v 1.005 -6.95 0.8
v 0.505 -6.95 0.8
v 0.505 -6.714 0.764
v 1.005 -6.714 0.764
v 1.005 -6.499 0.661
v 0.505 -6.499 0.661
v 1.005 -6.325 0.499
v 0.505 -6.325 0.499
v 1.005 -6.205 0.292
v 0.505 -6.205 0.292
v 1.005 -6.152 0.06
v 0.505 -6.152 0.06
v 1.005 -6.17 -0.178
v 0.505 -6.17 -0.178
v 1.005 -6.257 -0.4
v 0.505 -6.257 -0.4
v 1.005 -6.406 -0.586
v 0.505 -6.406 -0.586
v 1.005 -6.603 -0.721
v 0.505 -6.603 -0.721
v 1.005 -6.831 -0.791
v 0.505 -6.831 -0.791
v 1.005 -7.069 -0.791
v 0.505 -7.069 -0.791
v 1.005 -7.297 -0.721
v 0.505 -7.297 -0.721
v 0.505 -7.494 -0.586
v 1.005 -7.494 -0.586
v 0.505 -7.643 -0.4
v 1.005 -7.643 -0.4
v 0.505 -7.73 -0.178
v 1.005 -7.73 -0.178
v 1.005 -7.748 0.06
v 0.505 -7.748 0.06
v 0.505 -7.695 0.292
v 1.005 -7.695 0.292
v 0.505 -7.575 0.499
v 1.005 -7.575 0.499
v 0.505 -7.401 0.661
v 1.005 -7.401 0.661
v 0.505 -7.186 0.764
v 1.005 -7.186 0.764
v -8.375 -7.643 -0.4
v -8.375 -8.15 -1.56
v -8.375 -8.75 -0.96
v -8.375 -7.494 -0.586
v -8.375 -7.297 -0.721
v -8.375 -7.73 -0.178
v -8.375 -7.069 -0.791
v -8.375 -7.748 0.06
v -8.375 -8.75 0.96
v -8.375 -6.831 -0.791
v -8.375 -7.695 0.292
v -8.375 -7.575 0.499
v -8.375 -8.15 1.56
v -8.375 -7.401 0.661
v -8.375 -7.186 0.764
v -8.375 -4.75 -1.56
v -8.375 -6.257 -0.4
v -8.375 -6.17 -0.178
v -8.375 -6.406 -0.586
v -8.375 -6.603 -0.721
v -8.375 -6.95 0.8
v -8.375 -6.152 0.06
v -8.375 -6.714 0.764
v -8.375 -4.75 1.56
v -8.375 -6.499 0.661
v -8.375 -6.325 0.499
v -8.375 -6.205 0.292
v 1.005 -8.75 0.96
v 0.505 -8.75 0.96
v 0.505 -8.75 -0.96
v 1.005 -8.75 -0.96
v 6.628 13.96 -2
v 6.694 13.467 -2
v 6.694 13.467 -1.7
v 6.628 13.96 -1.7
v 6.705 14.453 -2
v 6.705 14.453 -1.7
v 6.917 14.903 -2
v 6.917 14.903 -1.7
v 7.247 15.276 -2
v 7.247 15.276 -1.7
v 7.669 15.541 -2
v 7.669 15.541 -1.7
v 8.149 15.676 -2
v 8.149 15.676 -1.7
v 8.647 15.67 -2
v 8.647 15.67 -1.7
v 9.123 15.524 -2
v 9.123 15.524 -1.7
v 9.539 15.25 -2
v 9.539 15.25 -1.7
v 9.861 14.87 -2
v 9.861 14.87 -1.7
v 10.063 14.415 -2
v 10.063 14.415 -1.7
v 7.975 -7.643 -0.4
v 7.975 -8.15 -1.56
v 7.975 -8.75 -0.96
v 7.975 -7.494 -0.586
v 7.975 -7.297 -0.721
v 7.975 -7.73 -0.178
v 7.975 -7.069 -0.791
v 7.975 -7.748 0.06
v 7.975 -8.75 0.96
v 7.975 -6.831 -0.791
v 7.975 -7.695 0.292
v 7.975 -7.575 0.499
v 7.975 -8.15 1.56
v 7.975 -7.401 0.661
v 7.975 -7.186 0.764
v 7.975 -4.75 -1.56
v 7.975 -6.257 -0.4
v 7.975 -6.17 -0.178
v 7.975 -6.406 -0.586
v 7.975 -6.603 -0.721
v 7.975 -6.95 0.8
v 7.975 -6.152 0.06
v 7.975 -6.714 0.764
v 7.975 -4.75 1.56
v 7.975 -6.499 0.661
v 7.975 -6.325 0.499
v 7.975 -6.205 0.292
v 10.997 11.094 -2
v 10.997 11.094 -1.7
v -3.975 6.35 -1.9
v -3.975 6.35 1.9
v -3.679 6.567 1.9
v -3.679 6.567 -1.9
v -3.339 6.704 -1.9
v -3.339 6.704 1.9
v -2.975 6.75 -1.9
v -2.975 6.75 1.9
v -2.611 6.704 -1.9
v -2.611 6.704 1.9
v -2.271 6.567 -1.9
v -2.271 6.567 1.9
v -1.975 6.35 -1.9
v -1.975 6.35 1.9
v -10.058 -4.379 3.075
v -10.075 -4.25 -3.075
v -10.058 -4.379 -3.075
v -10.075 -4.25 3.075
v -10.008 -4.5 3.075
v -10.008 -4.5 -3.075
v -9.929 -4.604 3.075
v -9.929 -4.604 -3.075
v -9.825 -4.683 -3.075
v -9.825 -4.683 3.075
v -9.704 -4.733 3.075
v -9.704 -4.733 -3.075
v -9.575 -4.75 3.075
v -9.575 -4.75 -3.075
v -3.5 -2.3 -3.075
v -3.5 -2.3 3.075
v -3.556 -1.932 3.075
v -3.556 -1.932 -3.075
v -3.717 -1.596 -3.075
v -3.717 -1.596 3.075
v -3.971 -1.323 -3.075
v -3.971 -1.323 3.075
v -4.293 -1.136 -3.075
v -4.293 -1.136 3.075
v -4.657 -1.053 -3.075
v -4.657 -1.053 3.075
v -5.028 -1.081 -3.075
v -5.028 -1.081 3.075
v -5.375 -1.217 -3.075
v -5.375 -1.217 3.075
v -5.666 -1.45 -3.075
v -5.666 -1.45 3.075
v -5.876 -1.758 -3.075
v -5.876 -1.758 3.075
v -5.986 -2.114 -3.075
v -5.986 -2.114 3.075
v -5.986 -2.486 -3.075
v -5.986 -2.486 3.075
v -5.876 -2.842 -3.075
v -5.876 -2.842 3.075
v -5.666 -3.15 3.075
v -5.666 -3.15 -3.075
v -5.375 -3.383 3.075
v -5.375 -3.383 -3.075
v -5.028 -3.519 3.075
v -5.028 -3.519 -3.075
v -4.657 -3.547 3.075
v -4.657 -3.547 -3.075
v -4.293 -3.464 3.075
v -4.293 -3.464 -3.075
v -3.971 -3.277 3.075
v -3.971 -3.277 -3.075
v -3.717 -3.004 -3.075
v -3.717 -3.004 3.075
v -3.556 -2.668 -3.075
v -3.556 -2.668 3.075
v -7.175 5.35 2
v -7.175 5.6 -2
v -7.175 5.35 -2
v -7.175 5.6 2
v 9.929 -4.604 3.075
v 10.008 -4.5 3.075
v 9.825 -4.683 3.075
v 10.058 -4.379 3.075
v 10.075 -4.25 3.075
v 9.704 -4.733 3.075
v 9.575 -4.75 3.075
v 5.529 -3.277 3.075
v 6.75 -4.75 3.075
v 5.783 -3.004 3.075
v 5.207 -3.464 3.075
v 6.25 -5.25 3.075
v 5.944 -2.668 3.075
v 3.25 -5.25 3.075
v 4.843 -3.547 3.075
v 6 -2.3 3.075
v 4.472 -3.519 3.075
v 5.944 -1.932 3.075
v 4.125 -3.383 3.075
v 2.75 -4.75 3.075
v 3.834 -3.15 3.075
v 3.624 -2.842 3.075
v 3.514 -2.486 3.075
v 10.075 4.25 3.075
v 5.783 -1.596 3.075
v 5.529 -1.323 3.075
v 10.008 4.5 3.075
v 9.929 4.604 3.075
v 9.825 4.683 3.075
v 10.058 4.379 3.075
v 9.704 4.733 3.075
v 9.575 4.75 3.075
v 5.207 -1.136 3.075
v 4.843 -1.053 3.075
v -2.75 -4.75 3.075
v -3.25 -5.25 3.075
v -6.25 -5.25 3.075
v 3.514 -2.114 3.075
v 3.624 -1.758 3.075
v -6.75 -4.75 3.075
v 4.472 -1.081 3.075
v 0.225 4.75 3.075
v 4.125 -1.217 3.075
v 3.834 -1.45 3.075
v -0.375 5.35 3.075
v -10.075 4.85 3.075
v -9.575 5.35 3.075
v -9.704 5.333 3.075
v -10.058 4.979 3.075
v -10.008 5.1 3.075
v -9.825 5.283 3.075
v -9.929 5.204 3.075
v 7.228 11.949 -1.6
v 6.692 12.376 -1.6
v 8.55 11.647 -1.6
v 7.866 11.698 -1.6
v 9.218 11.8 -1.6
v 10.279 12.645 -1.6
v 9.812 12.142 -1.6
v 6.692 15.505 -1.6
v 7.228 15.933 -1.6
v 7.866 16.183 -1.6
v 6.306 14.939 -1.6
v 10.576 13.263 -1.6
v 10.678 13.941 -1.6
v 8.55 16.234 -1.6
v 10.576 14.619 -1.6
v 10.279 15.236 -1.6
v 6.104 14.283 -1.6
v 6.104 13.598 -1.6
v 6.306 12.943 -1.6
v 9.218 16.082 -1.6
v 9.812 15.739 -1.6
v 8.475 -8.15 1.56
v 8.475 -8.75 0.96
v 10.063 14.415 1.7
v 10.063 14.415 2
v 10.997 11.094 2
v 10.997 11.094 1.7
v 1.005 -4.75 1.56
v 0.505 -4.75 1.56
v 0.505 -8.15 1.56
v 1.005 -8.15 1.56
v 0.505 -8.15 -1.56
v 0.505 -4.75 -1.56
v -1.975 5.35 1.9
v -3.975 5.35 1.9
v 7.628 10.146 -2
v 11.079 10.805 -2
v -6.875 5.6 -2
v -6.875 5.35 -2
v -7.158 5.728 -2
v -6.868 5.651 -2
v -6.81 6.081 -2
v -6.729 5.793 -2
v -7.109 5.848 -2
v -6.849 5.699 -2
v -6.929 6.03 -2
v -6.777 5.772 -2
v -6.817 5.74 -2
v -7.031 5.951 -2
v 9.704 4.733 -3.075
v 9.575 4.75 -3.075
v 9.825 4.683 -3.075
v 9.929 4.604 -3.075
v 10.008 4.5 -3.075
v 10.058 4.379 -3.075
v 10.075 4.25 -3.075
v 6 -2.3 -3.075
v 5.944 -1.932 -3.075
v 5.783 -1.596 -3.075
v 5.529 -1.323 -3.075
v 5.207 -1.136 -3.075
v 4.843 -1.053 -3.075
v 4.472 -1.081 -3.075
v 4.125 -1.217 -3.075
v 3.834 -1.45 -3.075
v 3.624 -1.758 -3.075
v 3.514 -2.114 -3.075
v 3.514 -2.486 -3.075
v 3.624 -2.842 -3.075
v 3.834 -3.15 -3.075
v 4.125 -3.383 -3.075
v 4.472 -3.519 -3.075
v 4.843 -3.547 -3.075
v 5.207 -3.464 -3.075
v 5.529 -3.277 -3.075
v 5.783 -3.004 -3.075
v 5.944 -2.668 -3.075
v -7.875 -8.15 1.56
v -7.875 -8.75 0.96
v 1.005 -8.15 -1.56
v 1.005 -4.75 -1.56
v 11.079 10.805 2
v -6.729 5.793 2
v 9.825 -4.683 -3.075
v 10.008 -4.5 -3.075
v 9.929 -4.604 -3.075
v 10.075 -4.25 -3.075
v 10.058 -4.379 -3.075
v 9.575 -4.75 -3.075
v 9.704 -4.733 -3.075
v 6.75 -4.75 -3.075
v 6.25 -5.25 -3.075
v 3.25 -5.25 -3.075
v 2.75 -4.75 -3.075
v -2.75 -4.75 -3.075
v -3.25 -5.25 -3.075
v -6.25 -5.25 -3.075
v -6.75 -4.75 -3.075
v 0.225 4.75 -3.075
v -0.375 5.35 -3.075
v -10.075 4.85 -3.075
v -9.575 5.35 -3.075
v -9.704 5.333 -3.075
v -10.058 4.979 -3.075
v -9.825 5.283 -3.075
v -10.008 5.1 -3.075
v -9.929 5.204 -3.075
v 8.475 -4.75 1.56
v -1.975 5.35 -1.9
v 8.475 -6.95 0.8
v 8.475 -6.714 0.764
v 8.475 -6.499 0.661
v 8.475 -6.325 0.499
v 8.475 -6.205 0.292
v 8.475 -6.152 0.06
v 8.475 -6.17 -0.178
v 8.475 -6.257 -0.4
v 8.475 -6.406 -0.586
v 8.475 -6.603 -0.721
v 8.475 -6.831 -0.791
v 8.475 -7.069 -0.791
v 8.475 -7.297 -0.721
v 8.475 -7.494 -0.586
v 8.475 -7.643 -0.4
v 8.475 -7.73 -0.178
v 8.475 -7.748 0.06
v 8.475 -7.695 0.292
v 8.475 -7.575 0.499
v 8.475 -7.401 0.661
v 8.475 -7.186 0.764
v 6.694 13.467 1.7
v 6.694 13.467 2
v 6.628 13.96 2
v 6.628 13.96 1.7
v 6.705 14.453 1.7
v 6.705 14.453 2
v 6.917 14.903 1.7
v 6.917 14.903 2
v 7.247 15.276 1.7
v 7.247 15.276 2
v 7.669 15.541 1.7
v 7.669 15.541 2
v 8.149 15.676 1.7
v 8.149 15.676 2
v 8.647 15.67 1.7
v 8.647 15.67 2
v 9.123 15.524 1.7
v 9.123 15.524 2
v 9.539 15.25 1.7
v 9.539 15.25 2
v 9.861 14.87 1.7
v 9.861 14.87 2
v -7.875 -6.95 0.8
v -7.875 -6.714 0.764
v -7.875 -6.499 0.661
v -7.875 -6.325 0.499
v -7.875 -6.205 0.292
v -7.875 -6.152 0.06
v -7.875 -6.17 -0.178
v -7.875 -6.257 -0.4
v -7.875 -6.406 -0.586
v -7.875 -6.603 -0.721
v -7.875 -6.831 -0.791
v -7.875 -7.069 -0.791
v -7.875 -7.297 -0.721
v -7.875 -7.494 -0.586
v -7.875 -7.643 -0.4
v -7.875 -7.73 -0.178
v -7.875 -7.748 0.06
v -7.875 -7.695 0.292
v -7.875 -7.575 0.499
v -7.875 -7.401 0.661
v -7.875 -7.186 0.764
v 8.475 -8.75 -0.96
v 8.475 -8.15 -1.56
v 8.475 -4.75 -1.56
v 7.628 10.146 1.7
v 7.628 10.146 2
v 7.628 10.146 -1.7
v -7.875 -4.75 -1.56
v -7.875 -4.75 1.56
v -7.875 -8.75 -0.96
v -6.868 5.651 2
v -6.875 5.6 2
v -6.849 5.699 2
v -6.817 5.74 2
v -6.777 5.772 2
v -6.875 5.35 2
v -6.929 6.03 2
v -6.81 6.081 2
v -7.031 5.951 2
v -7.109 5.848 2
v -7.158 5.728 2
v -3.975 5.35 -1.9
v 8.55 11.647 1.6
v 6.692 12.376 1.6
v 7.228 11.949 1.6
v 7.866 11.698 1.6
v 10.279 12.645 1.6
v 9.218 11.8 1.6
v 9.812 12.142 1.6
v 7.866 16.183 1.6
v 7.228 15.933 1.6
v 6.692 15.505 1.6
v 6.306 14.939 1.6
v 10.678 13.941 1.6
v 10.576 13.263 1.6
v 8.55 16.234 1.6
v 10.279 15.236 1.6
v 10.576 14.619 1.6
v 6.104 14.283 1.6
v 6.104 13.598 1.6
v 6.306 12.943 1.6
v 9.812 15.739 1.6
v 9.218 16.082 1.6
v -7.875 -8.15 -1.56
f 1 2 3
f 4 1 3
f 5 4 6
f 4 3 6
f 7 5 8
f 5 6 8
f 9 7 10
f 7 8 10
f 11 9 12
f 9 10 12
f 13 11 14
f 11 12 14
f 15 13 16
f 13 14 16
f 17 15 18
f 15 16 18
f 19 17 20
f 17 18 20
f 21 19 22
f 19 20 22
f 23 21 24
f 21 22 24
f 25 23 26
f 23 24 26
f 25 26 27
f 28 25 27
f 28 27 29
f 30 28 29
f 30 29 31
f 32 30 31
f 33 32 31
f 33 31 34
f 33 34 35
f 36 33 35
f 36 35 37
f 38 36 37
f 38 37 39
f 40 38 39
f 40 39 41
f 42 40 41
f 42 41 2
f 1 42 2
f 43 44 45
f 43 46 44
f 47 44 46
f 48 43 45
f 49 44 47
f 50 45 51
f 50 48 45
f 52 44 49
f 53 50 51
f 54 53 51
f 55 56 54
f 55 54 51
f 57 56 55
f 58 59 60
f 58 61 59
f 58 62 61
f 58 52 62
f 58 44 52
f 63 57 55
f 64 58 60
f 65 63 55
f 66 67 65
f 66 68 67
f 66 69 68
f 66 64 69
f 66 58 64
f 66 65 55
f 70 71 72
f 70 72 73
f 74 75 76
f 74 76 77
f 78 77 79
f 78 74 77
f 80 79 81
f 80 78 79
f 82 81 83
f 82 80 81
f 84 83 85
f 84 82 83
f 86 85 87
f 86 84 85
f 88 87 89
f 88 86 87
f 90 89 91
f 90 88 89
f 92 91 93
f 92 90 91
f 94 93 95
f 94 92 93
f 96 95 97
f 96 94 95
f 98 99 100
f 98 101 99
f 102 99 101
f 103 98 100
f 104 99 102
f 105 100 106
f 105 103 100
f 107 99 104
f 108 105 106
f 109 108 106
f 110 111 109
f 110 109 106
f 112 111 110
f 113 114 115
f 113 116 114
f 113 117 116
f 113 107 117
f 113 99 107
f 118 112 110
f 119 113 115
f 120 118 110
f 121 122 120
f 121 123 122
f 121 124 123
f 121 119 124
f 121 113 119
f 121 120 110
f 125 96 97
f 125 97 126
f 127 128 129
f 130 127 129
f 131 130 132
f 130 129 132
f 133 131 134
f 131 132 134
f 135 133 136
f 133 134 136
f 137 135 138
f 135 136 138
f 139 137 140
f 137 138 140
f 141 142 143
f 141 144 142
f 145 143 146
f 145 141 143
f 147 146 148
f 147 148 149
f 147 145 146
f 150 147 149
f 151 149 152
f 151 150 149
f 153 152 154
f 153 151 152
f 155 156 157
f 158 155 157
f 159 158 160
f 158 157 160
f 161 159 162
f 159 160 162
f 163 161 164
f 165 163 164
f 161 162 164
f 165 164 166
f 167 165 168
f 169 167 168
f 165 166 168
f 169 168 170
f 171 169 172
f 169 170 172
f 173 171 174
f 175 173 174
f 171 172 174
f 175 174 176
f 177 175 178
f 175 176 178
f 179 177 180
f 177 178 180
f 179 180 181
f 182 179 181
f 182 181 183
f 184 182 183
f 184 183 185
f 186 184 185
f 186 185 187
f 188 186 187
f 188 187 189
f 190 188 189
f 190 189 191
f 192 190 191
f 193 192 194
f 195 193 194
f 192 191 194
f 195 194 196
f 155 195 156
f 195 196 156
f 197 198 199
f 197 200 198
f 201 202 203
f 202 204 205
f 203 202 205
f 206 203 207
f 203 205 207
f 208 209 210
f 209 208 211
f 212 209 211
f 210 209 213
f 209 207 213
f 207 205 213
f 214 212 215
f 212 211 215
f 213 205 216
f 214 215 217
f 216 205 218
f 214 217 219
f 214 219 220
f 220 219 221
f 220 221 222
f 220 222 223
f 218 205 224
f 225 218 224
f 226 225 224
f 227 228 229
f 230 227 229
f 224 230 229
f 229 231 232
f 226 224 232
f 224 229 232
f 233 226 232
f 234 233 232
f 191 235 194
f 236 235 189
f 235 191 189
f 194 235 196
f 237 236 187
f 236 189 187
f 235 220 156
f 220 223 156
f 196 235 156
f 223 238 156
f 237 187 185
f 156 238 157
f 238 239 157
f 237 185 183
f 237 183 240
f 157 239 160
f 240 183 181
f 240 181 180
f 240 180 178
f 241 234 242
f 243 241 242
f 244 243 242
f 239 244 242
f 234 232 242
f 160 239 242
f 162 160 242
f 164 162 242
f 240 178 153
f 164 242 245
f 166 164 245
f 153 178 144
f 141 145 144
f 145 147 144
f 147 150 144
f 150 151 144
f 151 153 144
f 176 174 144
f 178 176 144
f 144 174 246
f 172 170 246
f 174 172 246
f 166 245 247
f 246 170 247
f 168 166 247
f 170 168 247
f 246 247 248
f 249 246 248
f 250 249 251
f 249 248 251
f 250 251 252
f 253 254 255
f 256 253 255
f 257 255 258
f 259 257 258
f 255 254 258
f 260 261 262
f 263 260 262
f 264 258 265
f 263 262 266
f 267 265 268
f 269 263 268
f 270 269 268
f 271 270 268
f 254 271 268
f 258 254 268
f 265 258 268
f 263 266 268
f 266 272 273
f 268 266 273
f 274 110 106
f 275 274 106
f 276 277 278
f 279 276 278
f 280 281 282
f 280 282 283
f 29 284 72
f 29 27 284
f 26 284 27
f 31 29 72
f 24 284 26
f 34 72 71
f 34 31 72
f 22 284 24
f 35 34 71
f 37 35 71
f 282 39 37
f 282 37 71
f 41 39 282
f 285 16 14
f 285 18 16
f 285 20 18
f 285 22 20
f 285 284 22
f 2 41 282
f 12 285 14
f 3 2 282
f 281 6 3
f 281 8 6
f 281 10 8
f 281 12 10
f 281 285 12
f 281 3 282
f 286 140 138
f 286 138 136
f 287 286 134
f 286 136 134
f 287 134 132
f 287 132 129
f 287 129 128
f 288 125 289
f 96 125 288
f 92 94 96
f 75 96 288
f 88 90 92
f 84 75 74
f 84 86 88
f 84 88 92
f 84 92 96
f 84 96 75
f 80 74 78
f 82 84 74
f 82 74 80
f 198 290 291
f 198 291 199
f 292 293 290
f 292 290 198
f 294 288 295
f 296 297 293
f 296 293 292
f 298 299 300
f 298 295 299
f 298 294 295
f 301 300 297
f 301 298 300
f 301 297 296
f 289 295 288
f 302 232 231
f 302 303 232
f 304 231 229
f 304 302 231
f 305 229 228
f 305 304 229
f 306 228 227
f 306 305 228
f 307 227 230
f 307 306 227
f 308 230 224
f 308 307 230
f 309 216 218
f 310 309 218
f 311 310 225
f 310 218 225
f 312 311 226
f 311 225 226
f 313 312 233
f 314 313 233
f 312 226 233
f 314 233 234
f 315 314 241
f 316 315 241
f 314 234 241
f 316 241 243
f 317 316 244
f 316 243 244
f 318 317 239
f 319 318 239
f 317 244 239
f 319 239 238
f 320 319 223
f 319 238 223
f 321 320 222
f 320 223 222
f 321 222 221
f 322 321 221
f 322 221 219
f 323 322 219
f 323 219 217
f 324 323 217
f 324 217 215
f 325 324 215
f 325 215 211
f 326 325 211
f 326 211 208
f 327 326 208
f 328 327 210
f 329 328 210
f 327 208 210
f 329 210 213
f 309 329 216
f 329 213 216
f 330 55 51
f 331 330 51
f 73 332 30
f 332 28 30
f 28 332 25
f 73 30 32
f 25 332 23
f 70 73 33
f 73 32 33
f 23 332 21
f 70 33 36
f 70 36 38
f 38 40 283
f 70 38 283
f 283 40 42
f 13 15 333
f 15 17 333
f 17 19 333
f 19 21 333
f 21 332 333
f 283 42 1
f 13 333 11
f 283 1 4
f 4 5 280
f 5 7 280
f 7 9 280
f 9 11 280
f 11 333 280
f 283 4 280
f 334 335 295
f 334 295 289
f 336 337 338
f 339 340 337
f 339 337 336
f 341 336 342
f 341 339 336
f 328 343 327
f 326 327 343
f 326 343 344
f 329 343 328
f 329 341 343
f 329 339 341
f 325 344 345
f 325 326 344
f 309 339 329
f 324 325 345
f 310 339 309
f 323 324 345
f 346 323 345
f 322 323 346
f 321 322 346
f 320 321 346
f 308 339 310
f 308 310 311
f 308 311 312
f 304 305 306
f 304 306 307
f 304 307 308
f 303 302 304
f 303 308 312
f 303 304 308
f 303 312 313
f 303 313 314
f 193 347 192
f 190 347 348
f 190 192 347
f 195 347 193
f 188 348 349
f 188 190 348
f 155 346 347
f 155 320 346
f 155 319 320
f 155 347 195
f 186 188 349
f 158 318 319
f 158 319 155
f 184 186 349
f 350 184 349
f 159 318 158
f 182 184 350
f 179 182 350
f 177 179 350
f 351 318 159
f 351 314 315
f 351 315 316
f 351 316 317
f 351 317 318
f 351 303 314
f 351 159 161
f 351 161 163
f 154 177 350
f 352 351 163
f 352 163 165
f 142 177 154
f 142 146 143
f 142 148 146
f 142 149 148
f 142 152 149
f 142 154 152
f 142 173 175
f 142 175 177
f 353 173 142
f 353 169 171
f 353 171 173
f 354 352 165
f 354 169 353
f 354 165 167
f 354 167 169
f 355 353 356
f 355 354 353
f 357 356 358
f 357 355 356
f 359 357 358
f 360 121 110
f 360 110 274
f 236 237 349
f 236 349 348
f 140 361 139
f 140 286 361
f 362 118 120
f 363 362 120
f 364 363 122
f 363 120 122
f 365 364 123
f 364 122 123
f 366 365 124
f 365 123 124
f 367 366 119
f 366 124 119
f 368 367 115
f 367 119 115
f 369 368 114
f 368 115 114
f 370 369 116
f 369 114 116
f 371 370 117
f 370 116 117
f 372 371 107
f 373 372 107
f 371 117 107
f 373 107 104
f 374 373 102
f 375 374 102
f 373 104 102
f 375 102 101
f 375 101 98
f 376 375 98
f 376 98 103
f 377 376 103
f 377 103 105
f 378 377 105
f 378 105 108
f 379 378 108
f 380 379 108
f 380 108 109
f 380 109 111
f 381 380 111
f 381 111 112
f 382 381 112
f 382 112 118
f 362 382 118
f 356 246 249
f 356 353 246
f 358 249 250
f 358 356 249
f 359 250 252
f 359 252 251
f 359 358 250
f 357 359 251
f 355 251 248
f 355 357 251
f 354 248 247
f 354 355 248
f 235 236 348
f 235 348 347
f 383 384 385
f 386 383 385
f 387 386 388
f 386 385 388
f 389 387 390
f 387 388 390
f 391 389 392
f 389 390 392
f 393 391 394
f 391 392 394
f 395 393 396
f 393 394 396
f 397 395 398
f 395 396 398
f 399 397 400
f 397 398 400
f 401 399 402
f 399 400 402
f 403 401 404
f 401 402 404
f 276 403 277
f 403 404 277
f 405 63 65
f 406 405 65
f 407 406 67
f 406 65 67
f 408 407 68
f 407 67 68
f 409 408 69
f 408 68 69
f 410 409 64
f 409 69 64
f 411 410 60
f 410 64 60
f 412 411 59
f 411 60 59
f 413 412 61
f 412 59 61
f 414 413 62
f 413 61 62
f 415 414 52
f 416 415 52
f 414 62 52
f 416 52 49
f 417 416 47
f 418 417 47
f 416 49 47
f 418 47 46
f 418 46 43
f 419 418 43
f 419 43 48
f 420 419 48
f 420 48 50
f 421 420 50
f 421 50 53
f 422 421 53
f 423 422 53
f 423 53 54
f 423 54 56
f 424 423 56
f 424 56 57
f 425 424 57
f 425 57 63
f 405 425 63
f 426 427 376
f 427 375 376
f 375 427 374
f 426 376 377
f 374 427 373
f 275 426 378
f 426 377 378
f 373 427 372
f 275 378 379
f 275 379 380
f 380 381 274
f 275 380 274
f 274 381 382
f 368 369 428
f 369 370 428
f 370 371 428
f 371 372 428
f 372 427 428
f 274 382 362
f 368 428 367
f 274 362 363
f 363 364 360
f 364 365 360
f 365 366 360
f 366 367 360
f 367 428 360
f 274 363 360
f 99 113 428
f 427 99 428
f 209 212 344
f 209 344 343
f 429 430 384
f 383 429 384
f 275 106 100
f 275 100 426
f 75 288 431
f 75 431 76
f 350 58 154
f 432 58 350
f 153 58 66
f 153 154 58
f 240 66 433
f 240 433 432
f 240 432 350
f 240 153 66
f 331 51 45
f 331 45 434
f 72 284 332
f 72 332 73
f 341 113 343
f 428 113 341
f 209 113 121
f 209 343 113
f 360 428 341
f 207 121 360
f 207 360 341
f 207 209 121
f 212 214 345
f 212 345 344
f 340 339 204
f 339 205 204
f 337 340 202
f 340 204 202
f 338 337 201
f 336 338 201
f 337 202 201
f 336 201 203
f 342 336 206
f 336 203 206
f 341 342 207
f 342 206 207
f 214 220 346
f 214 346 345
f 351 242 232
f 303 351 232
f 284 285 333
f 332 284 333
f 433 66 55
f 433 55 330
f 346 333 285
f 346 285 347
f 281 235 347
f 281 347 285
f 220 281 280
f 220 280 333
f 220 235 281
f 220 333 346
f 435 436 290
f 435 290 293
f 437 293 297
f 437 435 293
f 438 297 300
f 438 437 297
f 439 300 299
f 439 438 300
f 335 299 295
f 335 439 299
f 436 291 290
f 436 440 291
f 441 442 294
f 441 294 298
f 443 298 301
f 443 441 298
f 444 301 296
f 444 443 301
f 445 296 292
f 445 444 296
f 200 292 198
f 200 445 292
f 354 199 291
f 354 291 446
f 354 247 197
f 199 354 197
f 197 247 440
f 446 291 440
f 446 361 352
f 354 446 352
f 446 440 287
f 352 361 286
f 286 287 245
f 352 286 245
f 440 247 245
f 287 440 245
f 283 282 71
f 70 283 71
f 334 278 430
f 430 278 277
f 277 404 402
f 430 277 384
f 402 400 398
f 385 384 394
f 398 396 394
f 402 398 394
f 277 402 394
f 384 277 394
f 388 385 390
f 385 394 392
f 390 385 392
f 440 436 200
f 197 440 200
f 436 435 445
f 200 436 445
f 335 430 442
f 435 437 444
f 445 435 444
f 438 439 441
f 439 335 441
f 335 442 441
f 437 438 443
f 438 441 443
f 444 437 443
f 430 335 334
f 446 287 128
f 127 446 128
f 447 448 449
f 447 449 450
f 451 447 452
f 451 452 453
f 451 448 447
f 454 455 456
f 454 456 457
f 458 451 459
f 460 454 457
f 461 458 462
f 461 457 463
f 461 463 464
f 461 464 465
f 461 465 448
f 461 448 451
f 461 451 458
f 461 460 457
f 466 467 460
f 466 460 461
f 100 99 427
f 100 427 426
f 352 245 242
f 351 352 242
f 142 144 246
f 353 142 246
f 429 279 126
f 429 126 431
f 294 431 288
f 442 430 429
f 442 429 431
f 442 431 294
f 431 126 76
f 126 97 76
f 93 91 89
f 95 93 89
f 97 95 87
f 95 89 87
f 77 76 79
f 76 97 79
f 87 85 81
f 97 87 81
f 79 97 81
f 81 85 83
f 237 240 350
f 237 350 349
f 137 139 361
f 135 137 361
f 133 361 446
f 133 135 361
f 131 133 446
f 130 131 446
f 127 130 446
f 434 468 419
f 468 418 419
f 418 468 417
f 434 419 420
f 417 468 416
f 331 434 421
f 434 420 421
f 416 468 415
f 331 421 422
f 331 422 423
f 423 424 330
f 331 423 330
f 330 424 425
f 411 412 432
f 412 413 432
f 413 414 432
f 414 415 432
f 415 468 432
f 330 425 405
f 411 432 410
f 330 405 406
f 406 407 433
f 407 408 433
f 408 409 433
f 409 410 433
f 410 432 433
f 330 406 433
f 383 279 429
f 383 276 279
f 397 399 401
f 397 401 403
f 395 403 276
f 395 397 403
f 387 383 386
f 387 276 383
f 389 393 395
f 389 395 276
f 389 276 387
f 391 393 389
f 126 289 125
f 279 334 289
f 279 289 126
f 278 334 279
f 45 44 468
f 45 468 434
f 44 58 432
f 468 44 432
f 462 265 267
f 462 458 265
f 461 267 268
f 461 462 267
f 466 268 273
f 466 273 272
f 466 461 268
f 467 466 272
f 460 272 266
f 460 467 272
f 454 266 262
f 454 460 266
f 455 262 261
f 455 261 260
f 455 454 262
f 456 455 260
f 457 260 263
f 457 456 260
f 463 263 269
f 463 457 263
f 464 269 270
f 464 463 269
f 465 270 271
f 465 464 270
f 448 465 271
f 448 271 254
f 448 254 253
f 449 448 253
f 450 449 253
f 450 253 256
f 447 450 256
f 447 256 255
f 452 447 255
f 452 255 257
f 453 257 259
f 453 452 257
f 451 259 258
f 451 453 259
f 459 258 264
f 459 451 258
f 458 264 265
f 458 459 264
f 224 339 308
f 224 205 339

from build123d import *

# Parameters (mm, degrees)
CROQUIS1_W              = 20.15
CROQUIS1_H              = 9.5
SALIENTE_EXTRUIR1_DEPTH = 3.075
SALIENTE_EXTRUIR2_DEPTH = 6.15
CROQUIS2_3_R            = 1.25
CORTAR_EXTRUIR1_DEPTH   = 6.15
SALIENTE_EXTRUIR3_DEPTH = 6.15
CROQUIS4_W              = 0.5
CROQUIS4_H              = 3.12
SALIENTE_EXTRUIR4_DEPTH = 4
CROQUIS5_R              = 0.8
CORTAR_EXTRUIR2_DEPTH   = 19.45
REDONDEO1_R             = 0.5
CROQUIS6_W              = 2
CROQUIS6_H              = 1
SALIENTE_EXTRUIR5_DEPTH = 1.9
SALIENTE_EXTRUIR7_DEPTH = 2
SALIENTE_EXTRUIR8_DEPTH = 0.3
CROQUIS9_R              = 2.3
SALIENTE_EXTRUIR9_DEPTH = 1.6


with BuildPart() as part:
    # Croquis1 → Saliente-Extruir1 (new body, symmetric)
    with BuildSketch(Plane.XY):
        Rectangle(CROQUIS1_W, CROQUIS1_H)
    extrude(amount=SALIENTE_EXTRUIR1_DEPTH, both=True)

    # Croquis2 → Saliente-Extruir2 (add)
    with BuildSketch(Plane.XY.offset(3.075)):
        Polygon((-2.75, -4.75), (-6.75, -4.75), (-6.25, -5.25), (-3.25, -5.25), align=None)
        Polygon((6.75, -4.75), (2.75, -4.75), (3.25, -5.25), (6.25, -5.25), align=None)
    extrude(amount=-SALIENTE_EXTRUIR2_DEPTH)

    # Croquis2_3 → Cortar-Extruir1 (cut)
    with BuildSketch(Plane.XY.offset(3.075)):
        with Locations((-4.75, -2.3)):
            Circle(CROQUIS2_3_R)
        with Locations((4.75, -2.3)):
            Circle(CROQUIS2_3_R)
    extrude(amount=-CORTAR_EXTRUIR1_DEPTH, mode=Mode.SUBTRACT)

    # Croquis3 → Saliente-Extruir3 (add)
    with BuildSketch(Plane.XY.offset(3.075)):
        Polygon((-10.075, 4.75), (-10.075, 5.35), (-0.375, 5.35), (0.225, 4.75), align=None)
    extrude(amount=-SALIENTE_EXTRUIR3_DEPTH)

    # Croquis4 → Saliente-Extruir4 (add)
    with BuildSketch(Plane.XZ.offset(4.75)):
        with Locations((8.225, 0)):
            Rectangle(CROQUIS4_W, CROQUIS4_H)
        with Locations((-8.125, 0)):
            Rectangle(CROQUIS4_W, CROQUIS4_H)
        with Locations((0.755, 0)):
            Rectangle(CROQUIS4_W, CROQUIS4_H)
    extrude(amount=SALIENTE_EXTRUIR4_DEPTH)

    # Croquis5 → Cortar-Extruir2 (cut, through all)
    with BuildSketch(Plane.ZY.offset(8.375)):
        with Locations((0, -6.95)):
            Circle(CROQUIS5_R)
        Polygon((-1.56, -8.15), (-0.96, -8.75), (-1.56, -8.75), align=None)
        Polygon((1.56, -8.75), (1.56, -8.15), (0.96, -8.75), align=None)
    extrude(amount=-CORTAR_EXTRUIR2_DEPTH, mode=Mode.SUBTRACT)

    # Redondeo1
    redondeo1_edges = [part.edges().sort_by_distance(p)[0] for p in [
        (-10.075, 5.35, 0),
        (10.075, -4.75, 0),
        (-10.075, -4.75, 0),
        (10.075, 4.75, 0),
    ]]
    fillet(redondeo1_edges, radius=REDONDEO1_R)

    # Croquis6 → Saliente-Extruir5 (add, symmetric)
    with BuildSketch(Plane.XY):
        with BuildLine():
            ThreePointArc((-3.975, 6.35), (-2.975, 6.75), (-1.975, 6.35))
            Line((-1.975, 6.35), (-3.975, 6.35))
        make_face()
        with Locations((-2.975, 5.85)):
            Rectangle(CROQUIS6_W, CROQUIS6_H)
    extrude(amount=SALIENTE_EXTRUIR5_DEPTH, both=True)

    # Croquis7 → Saliente-Extruir7 (add, symmetric)
    with BuildSketch(Plane.XY):
        with BuildLine():
            Line((-6.875, 5.35), (-6.875, 5.6))
            ThreePointArc((-6.875, 5.6), (-6.834433546, 5.720751581), (-6.729190556, 5.792518528))
            Line((-6.729190556, 5.792518528), (11.078773292, 10.805144944))
            Line((11.078773292, 10.805144944), (10.997487458, 11.093922737))
            Line((10.997487458, 11.093922737), (-6.81047639, 6.08129632))
            ThreePointArc((-6.81047639, 6.08129632), (-7.073583865, 5.901878954), (-7.175, 5.6))
            Line((-7.175, 5.6), (-7.175, 5.35))
            Line((-7.175, 5.35), (-6.875, 5.35))
        make_face()
    extrude(amount=SALIENTE_EXTRUIR7_DEPTH, both=True)

    # Croquis8 → Saliente-Extruir8 (add)
    with BuildSketch(Plane.XY.offset(2)):
        with BuildLine():
            Line((10.997487458, 11.093922737), (7.628413217, 10.145588009))
            Line((7.628413217, 10.145588009), (6.693626128, 13.466532619))
            ThreePointArc((6.693626128, 13.466532619), (7.903995885, 15.625237103), (10.06270037, 14.414867346))
            Line((10.06270037, 14.414867346), (10.997487458, 11.093922737))
        make_face()
    saliente_extruir8 = extrude(amount=-SALIENTE_EXTRUIR8_DEPTH)

    # Simetr_a1: Saliente-Extruir8 across plane
    add(saliente_extruir8.mirror(Plane.XY))


with BuildPart() as body_2:
    # Croquis9 → Saliente-Extruir9 (new body, symmetric)
    with BuildSketch(Plane.XY):
        with Locations((8.378163249, 13.940699982)):
            Circle(CROQUIS9_R)
    extrude(amount=SALIENTE_EXTRUIR9_DEPTH, both=True)


solid = Compound([part.part, body_2.part])
